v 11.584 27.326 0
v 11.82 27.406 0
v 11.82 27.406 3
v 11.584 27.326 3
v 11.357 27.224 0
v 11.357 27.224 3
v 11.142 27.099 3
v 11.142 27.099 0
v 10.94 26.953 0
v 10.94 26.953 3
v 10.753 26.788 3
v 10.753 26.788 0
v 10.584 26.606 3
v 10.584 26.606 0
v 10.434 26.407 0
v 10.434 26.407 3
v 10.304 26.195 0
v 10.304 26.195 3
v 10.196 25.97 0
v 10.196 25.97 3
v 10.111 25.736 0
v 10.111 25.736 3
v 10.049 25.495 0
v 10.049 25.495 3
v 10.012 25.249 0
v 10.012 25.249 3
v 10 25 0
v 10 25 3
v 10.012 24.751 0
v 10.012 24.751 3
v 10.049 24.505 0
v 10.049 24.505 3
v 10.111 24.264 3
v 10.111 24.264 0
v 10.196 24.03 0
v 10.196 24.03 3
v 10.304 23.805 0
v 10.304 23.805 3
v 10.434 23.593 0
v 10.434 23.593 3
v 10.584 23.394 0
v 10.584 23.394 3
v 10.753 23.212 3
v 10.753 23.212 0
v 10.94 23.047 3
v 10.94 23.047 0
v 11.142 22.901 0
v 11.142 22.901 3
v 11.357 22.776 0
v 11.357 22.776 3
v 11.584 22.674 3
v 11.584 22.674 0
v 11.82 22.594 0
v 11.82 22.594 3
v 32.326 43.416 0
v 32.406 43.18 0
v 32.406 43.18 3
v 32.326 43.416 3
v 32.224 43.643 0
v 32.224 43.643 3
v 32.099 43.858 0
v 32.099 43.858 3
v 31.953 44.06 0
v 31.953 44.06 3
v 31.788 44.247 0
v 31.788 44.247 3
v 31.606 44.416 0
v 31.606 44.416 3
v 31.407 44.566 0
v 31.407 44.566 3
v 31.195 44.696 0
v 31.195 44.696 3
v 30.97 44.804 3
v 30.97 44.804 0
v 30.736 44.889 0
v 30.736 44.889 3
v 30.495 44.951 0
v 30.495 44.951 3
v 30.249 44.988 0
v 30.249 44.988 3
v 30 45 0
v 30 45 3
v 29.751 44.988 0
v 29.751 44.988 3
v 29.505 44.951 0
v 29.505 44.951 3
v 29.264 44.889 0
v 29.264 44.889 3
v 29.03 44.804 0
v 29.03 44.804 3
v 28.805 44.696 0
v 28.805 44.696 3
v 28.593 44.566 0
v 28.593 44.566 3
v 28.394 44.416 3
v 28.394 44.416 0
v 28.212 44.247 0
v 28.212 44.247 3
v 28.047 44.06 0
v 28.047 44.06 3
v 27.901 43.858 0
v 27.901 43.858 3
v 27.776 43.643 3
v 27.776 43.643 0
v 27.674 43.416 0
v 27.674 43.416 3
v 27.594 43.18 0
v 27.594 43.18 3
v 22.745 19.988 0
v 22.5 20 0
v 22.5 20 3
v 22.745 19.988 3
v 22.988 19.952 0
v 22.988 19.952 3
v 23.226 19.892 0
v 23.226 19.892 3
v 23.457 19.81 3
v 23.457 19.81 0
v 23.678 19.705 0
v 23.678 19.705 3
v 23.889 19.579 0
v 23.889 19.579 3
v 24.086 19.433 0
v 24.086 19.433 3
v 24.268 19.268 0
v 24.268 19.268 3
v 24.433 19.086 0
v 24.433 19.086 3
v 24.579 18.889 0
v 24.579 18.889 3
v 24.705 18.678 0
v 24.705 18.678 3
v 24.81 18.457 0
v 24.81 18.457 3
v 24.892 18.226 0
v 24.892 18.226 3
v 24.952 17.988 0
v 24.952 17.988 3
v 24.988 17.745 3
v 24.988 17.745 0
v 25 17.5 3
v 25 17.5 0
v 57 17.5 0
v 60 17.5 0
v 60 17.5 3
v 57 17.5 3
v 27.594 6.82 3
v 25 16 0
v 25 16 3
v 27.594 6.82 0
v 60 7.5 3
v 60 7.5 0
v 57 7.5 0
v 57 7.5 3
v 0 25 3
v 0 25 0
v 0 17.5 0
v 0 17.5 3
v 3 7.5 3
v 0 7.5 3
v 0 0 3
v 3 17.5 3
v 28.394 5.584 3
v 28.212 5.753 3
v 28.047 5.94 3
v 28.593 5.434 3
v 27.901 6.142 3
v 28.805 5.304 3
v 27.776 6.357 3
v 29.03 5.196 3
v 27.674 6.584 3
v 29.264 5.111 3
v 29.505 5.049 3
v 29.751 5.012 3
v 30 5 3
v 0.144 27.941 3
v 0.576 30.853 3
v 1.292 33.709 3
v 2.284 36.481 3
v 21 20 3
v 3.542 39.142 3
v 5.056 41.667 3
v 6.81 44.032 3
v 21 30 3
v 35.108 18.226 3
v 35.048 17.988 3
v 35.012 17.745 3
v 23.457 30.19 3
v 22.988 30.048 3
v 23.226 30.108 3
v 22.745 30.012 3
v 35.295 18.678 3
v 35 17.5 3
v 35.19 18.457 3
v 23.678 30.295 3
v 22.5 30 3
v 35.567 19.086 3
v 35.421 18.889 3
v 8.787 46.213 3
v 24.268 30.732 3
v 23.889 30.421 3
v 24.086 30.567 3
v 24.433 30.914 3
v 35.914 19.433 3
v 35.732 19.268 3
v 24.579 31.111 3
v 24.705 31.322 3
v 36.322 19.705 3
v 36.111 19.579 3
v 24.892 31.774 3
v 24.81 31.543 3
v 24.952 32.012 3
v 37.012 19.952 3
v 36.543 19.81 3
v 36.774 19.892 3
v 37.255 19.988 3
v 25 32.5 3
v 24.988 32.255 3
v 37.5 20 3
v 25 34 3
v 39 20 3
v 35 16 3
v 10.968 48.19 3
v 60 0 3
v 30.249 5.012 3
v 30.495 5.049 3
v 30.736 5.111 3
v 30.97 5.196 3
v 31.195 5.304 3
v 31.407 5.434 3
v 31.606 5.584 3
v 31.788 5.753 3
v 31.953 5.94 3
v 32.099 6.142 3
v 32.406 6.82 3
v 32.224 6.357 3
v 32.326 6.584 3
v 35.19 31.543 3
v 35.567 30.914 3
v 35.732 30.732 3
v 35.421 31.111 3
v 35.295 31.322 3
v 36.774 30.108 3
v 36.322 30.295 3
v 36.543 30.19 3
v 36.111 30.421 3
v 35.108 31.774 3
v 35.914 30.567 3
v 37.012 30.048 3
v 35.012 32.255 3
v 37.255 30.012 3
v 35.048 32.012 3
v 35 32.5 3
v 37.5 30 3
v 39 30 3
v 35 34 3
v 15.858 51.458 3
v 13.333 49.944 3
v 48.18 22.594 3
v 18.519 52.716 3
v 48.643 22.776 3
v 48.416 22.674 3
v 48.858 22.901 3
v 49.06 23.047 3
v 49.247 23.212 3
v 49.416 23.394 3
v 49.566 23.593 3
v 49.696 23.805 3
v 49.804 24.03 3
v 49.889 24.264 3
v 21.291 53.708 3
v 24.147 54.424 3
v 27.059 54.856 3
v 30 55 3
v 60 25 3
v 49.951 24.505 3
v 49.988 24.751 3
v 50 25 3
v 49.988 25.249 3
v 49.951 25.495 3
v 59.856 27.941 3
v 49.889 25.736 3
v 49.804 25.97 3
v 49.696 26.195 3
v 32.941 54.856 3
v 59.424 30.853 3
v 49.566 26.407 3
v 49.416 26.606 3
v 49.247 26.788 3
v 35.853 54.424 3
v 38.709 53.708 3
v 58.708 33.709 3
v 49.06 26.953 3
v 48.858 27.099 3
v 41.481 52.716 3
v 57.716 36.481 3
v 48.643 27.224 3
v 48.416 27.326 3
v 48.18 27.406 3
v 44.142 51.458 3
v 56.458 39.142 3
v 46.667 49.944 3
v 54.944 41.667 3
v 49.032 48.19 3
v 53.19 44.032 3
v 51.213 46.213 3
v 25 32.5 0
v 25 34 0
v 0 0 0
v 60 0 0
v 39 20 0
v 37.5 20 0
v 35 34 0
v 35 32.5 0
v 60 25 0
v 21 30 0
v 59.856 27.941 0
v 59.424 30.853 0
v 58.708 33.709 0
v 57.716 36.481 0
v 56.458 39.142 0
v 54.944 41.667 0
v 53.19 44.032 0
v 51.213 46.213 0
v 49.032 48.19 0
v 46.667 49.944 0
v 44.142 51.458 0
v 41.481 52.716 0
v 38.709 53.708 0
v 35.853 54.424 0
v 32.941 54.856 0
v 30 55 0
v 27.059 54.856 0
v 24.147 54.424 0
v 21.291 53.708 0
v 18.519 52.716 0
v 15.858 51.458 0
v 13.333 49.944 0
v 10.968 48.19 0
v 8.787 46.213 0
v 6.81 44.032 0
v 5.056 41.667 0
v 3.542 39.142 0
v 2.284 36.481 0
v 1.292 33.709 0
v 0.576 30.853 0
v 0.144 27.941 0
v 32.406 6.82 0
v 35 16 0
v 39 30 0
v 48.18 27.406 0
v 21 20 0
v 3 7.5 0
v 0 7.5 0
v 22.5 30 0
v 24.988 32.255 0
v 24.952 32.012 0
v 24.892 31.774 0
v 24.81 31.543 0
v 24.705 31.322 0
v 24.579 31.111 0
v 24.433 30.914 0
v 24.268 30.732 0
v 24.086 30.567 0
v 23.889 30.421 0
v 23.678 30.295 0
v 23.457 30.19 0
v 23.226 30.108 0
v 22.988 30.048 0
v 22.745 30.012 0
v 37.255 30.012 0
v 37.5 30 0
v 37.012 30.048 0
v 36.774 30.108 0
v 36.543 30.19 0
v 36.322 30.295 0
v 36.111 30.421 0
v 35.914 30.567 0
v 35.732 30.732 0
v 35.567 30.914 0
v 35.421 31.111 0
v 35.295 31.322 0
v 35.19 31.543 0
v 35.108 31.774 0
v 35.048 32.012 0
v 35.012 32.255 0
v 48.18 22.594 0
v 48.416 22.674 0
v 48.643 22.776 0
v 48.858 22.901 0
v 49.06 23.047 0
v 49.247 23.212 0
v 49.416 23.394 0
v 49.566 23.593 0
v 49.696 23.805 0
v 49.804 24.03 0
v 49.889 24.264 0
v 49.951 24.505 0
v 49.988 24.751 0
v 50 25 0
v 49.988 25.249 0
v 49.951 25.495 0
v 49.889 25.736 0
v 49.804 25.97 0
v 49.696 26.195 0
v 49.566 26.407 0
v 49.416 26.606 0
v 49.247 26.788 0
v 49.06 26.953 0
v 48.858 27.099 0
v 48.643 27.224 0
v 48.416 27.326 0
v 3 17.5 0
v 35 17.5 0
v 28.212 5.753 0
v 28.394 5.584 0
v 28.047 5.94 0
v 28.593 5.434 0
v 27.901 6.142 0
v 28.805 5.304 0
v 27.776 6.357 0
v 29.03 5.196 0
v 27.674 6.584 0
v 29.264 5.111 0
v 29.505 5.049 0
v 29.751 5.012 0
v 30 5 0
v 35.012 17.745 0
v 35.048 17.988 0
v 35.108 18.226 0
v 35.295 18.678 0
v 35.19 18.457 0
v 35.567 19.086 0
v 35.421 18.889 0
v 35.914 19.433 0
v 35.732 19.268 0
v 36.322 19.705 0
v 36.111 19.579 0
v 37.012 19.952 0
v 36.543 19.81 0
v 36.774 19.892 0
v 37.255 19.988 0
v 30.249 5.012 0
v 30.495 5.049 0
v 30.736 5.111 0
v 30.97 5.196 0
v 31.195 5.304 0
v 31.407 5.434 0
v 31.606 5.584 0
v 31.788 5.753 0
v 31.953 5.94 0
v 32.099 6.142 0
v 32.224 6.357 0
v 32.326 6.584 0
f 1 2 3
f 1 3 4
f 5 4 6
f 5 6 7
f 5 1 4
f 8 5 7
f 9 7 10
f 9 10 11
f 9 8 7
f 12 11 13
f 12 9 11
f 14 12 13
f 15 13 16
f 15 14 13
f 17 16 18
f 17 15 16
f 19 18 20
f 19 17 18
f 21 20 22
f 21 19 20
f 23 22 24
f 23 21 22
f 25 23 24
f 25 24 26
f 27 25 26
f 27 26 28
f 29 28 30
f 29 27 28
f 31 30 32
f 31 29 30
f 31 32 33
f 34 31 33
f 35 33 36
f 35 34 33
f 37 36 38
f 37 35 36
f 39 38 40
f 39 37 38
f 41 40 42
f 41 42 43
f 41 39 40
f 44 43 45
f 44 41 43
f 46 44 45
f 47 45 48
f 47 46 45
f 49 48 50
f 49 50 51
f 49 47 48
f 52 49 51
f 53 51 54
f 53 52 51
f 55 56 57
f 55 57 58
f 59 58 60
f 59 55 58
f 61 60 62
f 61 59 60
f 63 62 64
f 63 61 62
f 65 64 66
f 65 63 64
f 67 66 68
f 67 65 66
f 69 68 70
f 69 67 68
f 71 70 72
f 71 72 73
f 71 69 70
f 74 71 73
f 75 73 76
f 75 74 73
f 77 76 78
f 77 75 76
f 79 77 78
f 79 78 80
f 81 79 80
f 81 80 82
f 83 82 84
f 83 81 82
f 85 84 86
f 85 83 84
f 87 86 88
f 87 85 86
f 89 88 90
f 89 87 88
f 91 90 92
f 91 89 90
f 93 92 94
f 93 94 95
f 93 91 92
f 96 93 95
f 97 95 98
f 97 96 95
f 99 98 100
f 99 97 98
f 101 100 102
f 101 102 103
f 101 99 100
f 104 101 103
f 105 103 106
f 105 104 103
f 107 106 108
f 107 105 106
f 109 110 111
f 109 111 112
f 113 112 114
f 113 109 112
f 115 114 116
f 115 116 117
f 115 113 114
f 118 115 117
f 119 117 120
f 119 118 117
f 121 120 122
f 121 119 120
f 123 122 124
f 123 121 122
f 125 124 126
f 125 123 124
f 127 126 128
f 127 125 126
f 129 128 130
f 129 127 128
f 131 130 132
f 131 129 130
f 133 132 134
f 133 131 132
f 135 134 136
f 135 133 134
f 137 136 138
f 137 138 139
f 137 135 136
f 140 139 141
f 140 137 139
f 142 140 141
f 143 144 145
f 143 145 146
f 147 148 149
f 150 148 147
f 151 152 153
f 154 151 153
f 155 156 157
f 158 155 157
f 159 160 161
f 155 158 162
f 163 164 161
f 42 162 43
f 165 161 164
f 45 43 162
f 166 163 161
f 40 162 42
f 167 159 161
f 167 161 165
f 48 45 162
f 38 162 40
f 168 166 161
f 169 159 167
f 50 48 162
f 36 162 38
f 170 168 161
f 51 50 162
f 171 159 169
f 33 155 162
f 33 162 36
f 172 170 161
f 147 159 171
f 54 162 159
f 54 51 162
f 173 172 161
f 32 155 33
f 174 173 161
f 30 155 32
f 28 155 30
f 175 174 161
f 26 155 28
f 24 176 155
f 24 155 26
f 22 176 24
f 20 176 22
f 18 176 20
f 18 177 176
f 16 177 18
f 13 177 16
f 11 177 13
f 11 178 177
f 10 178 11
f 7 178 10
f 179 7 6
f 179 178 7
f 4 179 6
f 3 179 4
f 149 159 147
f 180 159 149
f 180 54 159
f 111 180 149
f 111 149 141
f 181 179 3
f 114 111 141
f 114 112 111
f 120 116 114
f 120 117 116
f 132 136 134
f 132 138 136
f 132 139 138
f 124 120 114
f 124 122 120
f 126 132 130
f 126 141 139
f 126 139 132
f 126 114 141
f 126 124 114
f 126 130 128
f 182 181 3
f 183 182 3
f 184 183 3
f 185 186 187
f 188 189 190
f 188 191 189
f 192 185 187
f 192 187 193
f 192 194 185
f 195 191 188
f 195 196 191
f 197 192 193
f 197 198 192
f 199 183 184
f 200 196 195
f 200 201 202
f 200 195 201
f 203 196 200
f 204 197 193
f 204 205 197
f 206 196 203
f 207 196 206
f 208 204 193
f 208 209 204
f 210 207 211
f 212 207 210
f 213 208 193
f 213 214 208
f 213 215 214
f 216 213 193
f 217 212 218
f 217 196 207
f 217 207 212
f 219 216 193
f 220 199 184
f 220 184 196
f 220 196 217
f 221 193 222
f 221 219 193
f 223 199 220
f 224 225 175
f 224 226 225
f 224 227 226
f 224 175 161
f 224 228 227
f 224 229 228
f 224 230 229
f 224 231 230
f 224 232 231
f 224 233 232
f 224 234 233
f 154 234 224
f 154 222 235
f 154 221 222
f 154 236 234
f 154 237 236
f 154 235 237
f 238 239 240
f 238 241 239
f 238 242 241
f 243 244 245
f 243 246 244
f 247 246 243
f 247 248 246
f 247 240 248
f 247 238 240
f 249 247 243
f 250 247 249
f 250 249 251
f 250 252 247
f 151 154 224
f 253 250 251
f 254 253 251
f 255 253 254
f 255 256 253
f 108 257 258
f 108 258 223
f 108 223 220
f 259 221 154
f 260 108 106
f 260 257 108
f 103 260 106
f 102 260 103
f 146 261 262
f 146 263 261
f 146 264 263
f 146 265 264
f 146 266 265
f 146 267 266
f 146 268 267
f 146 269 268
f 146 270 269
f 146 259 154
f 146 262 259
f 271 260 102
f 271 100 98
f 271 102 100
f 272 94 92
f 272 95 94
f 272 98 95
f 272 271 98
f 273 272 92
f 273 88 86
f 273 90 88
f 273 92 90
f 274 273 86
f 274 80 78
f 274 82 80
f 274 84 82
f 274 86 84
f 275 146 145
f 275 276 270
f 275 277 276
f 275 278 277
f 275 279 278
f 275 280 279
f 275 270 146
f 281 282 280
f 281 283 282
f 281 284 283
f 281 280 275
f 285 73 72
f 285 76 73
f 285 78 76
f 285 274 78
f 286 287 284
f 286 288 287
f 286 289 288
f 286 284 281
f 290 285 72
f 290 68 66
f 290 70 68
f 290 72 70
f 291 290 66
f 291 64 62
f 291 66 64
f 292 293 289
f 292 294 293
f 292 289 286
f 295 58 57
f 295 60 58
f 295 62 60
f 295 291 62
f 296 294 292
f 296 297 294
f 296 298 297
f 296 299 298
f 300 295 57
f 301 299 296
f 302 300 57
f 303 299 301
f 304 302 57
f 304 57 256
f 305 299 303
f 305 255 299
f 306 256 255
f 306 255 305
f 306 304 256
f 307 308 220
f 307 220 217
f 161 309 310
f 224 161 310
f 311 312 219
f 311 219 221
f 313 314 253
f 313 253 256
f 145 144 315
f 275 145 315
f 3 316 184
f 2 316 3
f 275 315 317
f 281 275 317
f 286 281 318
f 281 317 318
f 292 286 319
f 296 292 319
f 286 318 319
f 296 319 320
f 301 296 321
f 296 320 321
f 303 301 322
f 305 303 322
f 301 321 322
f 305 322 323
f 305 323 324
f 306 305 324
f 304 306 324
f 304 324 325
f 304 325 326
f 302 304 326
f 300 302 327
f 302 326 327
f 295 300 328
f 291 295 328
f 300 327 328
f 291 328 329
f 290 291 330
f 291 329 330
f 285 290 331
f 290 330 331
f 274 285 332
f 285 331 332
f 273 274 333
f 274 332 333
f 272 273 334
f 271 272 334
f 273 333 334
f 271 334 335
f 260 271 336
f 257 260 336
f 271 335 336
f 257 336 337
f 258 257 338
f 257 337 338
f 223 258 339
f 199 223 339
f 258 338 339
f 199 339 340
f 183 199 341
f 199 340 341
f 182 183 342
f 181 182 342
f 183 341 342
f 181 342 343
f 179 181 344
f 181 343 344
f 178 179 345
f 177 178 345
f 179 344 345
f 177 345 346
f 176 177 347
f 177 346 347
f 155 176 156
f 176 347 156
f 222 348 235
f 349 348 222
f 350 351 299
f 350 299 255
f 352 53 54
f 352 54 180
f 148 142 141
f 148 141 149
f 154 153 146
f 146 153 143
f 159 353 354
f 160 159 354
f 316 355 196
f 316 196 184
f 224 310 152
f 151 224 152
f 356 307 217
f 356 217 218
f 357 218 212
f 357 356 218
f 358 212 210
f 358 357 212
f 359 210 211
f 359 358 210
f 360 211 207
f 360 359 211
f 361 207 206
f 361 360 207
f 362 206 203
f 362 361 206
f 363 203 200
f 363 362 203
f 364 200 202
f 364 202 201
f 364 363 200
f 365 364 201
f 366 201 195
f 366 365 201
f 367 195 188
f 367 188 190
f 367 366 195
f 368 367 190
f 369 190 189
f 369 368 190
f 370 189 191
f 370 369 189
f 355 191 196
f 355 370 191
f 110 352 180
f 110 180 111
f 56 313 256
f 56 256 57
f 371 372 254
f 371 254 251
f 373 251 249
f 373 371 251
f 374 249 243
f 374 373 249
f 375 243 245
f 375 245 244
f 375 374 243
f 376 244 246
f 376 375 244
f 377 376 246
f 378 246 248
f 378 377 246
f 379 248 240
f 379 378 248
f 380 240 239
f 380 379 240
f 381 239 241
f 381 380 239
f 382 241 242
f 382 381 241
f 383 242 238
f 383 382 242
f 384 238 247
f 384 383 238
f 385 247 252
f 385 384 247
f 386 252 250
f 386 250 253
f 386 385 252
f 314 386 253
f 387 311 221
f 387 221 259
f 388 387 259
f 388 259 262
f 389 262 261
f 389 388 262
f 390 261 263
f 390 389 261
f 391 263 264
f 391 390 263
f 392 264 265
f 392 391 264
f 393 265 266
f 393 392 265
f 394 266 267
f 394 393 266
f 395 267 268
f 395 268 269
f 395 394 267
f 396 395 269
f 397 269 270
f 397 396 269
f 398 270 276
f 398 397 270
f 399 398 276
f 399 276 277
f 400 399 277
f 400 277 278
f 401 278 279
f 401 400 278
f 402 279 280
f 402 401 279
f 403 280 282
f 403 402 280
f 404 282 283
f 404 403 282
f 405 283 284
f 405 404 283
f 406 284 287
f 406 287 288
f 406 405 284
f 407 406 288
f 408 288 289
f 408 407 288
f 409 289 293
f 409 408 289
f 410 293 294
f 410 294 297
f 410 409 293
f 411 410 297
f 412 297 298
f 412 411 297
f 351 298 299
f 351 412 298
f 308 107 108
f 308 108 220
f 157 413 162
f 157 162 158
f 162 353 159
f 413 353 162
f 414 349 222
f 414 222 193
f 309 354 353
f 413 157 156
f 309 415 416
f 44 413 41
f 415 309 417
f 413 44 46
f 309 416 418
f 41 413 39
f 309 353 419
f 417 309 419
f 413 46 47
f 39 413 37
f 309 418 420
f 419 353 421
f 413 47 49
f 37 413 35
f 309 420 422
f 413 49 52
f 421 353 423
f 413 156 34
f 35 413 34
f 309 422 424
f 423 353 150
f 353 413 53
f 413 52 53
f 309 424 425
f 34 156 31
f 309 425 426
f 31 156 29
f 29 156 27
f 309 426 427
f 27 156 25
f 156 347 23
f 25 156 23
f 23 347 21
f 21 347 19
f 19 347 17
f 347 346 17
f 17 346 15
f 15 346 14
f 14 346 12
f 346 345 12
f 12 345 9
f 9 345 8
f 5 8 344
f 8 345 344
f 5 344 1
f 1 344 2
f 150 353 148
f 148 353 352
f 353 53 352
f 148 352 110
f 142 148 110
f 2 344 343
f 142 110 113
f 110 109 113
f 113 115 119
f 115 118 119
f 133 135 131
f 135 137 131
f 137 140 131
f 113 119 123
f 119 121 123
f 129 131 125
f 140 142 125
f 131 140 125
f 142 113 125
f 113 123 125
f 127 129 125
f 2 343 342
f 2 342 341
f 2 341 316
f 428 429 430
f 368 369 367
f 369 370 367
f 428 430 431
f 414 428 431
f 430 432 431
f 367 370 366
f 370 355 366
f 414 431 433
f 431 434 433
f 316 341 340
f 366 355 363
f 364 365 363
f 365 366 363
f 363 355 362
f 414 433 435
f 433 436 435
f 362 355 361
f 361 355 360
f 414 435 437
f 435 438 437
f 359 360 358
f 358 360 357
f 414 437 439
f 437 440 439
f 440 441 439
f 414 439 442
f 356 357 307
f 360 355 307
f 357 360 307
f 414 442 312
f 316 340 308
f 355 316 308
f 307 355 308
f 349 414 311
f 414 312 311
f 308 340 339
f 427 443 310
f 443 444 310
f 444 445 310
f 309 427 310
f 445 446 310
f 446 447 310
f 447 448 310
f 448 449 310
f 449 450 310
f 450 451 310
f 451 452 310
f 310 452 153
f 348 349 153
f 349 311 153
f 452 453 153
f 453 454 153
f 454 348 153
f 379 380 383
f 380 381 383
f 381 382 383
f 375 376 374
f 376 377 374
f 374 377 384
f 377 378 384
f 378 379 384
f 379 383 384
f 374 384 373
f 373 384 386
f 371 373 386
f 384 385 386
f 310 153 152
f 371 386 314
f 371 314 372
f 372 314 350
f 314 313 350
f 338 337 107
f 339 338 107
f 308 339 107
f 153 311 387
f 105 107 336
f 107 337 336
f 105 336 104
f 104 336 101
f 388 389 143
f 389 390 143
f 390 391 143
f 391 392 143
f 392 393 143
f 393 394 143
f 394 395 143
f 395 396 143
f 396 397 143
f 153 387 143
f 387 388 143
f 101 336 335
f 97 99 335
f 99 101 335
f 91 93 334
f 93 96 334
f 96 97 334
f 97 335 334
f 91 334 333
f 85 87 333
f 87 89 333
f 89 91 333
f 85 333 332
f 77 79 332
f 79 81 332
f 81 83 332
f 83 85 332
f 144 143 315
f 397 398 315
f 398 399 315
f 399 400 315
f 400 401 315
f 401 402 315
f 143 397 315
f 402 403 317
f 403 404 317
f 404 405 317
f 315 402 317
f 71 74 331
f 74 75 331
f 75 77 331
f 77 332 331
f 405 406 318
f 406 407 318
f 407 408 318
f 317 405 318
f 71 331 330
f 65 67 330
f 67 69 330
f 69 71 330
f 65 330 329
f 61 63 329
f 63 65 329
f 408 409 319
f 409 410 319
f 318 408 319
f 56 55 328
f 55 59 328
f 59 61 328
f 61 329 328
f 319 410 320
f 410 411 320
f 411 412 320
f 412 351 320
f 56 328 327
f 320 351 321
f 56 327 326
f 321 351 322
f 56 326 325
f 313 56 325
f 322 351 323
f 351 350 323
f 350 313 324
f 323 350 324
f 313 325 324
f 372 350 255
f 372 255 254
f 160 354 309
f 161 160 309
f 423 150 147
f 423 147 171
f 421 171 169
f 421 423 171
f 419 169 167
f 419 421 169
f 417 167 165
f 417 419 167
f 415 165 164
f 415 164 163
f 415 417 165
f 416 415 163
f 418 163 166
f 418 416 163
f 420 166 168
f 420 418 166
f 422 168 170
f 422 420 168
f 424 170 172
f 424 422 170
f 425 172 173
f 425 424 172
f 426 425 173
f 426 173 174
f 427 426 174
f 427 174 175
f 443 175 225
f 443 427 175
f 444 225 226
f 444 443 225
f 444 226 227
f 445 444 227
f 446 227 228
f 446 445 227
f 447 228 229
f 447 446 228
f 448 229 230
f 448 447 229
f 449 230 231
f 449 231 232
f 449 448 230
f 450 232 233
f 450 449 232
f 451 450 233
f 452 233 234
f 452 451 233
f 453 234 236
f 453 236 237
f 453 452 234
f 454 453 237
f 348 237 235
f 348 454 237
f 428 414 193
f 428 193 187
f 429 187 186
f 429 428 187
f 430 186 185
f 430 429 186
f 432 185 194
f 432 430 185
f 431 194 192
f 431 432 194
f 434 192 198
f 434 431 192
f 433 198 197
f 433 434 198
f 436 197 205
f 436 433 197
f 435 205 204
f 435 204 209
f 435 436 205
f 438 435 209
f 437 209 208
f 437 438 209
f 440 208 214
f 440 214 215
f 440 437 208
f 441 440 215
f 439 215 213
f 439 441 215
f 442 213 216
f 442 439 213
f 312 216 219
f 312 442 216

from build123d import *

# Parameters (mm, degrees)
BOSS_EXTRUDE1_DEPTH = 3
SKETCH2_W           = 3
SKETCH2_H           = 10
CUT_EXTRUDE1_DEPTH  = 82.449370777


with BuildPart() as part:
    # Sketch1 → Boss-Extrude1 (new body)
    with BuildSketch(Plane.XY):
        with BuildLine():
            Line((0, 0), (60, 0))
            Line((60, 0), (60, 25))
            ThreePointArc((60, 25), (30, 55), (0, 25))
            Line((0, 25), (0, 0))
        make_face()
        with BuildLine():
            Line((37.5, 20), (39, 20))
            Line((39, 20), (48.179870439, 22.594220254))
            ThreePointArc((48.179870439, 22.594220254), (50, 25), (48.179870439, 27.405779746))
            Line((48.179870439, 27.405779746), (39, 30))
            Line((39, 30), (37.5, 30))
            ThreePointArc((37.5, 30), (35.732233047, 30.732233047), (35, 32.5))
            Line((35, 32.5), (35, 34))
            Line((35, 34), (32.405779746, 43.179870439))
            ThreePointArc((32.405779746, 43.179870439), (30, 45), (27.594220254, 43.179870439))
            Line((27.594220254, 43.179870439), (25, 34))
            Line((25, 34), (25, 32.5))
            ThreePointArc((25, 32.5), (24.267766953, 30.732233047), (22.5, 30))
            Line((22.5, 30), (21, 30))
            Line((21, 30), (11.820129561, 27.405779746))
            ThreePointArc((11.820129561, 27.405779746), (10, 25), (11.820129561, 22.594220254))
            Line((11.820129561, 22.594220254), (21, 20))
            Line((21, 20), (22.5, 20))
            ThreePointArc((22.5, 20), (24.267766953, 19.267766953), (25, 17.5))
            Line((25, 17.5), (25, 16))
            Line((25, 16), (27.594220254, 6.820129561))
            ThreePointArc((27.594220254, 6.820129561), (30, 5), (32.405779746, 6.820129561))
            Line((32.405779746, 6.820129561), (35, 16))
            Line((35, 16), (35, 17.5))
            ThreePointArc((35, 17.5), (35.732233047, 19.267766953), (37.5, 20))
        make_face(mode=Mode.SUBTRACT)
    extrude(amount=BOSS_EXTRUDE1_DEPTH)

    # Sketch2 → Cut-Extrude1 (cut, through all)
    with BuildSketch(Plane(origin=(0, 0, 0), x_dir=(-1, 0, 0), z_dir=(0, 0, -1))):
        with Locations((-58.5, 12.5)):
            Rectangle(SKETCH2_W, SKETCH2_H)
        with Locations((-1.5, 12.5)):
            Rectangle(SKETCH2_W, SKETCH2_H)
    extrude(amount=-CUT_EXTRUDE1_DEPTH, mode=Mode.SUBTRACT)


solid = part.part
